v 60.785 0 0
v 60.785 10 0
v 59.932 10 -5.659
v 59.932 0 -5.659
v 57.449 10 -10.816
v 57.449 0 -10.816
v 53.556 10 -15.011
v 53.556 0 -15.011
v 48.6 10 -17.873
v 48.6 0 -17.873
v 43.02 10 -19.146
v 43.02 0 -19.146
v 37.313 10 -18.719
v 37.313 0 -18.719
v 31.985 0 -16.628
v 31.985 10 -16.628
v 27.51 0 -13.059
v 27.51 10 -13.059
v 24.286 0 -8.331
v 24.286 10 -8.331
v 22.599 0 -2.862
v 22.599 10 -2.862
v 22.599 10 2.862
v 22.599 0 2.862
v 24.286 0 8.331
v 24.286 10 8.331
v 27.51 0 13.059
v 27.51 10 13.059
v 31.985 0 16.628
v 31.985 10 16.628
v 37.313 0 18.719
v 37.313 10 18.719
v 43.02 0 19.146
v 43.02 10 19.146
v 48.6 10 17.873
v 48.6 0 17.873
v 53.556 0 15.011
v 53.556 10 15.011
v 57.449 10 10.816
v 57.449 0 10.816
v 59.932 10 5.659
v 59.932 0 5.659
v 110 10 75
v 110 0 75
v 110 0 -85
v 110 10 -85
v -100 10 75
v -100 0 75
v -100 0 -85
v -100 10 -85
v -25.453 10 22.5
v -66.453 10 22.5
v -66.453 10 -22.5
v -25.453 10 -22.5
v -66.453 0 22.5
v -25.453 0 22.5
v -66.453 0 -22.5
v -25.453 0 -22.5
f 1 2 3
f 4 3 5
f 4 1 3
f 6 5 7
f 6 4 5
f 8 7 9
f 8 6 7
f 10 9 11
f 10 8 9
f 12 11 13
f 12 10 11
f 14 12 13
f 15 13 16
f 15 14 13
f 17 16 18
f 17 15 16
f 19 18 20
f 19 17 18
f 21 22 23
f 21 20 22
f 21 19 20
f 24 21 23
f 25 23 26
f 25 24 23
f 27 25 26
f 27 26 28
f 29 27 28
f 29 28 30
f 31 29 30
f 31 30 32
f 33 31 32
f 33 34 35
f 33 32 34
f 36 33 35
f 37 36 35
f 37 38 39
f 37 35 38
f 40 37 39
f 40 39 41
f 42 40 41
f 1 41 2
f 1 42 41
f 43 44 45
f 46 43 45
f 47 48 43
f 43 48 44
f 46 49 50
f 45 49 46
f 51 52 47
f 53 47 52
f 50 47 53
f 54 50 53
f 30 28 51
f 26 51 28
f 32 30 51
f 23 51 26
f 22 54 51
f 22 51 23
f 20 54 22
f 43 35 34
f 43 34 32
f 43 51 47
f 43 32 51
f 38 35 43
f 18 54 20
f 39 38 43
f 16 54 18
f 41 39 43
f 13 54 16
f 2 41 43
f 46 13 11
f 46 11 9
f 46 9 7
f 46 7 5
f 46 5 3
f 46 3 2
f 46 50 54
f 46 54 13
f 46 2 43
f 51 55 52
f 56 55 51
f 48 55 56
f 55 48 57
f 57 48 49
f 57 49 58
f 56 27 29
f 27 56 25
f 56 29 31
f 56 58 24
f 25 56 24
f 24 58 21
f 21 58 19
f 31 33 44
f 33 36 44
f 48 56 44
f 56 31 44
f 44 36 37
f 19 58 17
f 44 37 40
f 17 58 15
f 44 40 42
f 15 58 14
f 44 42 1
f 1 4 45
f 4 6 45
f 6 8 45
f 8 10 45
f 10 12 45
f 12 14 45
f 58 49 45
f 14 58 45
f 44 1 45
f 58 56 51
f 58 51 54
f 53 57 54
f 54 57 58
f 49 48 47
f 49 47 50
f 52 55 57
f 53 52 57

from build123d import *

# Parameters (mm, degrees)
SKETCH2_W               = 210
SKETCH2_H               = 160
BOSS_EXTRUDE1_DEPTH     = 10
SKETCH3_R               = 19.2
SKETCH3_W               = 41
SKETCH3_H               = 45
CUT_EXTRUDE2_DEPTH      = 15
CUT_EXTRUDE2_DEPTH_BACK = 22


with BuildPart() as part:
    # Sketch2 → Boss-Extrude1 (new body)
    with BuildSketch(Plane(origin=(0, 0, 0), x_dir=(1, 0, 0), z_dir=(0, 1, 0))):
        with Locations((5, 5)):
            Rectangle(SKETCH2_W, SKETCH2_H)
    extrude(amount=BOSS_EXTRUDE1_DEPTH)

    # Sketch3 → Cut-Extrude2 (cut, two sides)
    with BuildSketch(Plane(origin=(0, 0, 0), x_dir=(1, 0, 0), z_dir=(0, 1, 0))) as cut_extrude2_sk:
        with Locations((41.585, 0)):
            Circle(SKETCH3_R)
        with Locations((-45.952707493, 0)):
            Rectangle(SKETCH3_W, SKETCH3_H)
    extrude(amount=CUT_EXTRUDE2_DEPTH, mode=Mode.SUBTRACT)
    extrude(cut_extrude2_sk.sketch, amount=-CUT_EXTRUDE2_DEPTH_BACK, mode=Mode.SUBTRACT)


solid = part.part
